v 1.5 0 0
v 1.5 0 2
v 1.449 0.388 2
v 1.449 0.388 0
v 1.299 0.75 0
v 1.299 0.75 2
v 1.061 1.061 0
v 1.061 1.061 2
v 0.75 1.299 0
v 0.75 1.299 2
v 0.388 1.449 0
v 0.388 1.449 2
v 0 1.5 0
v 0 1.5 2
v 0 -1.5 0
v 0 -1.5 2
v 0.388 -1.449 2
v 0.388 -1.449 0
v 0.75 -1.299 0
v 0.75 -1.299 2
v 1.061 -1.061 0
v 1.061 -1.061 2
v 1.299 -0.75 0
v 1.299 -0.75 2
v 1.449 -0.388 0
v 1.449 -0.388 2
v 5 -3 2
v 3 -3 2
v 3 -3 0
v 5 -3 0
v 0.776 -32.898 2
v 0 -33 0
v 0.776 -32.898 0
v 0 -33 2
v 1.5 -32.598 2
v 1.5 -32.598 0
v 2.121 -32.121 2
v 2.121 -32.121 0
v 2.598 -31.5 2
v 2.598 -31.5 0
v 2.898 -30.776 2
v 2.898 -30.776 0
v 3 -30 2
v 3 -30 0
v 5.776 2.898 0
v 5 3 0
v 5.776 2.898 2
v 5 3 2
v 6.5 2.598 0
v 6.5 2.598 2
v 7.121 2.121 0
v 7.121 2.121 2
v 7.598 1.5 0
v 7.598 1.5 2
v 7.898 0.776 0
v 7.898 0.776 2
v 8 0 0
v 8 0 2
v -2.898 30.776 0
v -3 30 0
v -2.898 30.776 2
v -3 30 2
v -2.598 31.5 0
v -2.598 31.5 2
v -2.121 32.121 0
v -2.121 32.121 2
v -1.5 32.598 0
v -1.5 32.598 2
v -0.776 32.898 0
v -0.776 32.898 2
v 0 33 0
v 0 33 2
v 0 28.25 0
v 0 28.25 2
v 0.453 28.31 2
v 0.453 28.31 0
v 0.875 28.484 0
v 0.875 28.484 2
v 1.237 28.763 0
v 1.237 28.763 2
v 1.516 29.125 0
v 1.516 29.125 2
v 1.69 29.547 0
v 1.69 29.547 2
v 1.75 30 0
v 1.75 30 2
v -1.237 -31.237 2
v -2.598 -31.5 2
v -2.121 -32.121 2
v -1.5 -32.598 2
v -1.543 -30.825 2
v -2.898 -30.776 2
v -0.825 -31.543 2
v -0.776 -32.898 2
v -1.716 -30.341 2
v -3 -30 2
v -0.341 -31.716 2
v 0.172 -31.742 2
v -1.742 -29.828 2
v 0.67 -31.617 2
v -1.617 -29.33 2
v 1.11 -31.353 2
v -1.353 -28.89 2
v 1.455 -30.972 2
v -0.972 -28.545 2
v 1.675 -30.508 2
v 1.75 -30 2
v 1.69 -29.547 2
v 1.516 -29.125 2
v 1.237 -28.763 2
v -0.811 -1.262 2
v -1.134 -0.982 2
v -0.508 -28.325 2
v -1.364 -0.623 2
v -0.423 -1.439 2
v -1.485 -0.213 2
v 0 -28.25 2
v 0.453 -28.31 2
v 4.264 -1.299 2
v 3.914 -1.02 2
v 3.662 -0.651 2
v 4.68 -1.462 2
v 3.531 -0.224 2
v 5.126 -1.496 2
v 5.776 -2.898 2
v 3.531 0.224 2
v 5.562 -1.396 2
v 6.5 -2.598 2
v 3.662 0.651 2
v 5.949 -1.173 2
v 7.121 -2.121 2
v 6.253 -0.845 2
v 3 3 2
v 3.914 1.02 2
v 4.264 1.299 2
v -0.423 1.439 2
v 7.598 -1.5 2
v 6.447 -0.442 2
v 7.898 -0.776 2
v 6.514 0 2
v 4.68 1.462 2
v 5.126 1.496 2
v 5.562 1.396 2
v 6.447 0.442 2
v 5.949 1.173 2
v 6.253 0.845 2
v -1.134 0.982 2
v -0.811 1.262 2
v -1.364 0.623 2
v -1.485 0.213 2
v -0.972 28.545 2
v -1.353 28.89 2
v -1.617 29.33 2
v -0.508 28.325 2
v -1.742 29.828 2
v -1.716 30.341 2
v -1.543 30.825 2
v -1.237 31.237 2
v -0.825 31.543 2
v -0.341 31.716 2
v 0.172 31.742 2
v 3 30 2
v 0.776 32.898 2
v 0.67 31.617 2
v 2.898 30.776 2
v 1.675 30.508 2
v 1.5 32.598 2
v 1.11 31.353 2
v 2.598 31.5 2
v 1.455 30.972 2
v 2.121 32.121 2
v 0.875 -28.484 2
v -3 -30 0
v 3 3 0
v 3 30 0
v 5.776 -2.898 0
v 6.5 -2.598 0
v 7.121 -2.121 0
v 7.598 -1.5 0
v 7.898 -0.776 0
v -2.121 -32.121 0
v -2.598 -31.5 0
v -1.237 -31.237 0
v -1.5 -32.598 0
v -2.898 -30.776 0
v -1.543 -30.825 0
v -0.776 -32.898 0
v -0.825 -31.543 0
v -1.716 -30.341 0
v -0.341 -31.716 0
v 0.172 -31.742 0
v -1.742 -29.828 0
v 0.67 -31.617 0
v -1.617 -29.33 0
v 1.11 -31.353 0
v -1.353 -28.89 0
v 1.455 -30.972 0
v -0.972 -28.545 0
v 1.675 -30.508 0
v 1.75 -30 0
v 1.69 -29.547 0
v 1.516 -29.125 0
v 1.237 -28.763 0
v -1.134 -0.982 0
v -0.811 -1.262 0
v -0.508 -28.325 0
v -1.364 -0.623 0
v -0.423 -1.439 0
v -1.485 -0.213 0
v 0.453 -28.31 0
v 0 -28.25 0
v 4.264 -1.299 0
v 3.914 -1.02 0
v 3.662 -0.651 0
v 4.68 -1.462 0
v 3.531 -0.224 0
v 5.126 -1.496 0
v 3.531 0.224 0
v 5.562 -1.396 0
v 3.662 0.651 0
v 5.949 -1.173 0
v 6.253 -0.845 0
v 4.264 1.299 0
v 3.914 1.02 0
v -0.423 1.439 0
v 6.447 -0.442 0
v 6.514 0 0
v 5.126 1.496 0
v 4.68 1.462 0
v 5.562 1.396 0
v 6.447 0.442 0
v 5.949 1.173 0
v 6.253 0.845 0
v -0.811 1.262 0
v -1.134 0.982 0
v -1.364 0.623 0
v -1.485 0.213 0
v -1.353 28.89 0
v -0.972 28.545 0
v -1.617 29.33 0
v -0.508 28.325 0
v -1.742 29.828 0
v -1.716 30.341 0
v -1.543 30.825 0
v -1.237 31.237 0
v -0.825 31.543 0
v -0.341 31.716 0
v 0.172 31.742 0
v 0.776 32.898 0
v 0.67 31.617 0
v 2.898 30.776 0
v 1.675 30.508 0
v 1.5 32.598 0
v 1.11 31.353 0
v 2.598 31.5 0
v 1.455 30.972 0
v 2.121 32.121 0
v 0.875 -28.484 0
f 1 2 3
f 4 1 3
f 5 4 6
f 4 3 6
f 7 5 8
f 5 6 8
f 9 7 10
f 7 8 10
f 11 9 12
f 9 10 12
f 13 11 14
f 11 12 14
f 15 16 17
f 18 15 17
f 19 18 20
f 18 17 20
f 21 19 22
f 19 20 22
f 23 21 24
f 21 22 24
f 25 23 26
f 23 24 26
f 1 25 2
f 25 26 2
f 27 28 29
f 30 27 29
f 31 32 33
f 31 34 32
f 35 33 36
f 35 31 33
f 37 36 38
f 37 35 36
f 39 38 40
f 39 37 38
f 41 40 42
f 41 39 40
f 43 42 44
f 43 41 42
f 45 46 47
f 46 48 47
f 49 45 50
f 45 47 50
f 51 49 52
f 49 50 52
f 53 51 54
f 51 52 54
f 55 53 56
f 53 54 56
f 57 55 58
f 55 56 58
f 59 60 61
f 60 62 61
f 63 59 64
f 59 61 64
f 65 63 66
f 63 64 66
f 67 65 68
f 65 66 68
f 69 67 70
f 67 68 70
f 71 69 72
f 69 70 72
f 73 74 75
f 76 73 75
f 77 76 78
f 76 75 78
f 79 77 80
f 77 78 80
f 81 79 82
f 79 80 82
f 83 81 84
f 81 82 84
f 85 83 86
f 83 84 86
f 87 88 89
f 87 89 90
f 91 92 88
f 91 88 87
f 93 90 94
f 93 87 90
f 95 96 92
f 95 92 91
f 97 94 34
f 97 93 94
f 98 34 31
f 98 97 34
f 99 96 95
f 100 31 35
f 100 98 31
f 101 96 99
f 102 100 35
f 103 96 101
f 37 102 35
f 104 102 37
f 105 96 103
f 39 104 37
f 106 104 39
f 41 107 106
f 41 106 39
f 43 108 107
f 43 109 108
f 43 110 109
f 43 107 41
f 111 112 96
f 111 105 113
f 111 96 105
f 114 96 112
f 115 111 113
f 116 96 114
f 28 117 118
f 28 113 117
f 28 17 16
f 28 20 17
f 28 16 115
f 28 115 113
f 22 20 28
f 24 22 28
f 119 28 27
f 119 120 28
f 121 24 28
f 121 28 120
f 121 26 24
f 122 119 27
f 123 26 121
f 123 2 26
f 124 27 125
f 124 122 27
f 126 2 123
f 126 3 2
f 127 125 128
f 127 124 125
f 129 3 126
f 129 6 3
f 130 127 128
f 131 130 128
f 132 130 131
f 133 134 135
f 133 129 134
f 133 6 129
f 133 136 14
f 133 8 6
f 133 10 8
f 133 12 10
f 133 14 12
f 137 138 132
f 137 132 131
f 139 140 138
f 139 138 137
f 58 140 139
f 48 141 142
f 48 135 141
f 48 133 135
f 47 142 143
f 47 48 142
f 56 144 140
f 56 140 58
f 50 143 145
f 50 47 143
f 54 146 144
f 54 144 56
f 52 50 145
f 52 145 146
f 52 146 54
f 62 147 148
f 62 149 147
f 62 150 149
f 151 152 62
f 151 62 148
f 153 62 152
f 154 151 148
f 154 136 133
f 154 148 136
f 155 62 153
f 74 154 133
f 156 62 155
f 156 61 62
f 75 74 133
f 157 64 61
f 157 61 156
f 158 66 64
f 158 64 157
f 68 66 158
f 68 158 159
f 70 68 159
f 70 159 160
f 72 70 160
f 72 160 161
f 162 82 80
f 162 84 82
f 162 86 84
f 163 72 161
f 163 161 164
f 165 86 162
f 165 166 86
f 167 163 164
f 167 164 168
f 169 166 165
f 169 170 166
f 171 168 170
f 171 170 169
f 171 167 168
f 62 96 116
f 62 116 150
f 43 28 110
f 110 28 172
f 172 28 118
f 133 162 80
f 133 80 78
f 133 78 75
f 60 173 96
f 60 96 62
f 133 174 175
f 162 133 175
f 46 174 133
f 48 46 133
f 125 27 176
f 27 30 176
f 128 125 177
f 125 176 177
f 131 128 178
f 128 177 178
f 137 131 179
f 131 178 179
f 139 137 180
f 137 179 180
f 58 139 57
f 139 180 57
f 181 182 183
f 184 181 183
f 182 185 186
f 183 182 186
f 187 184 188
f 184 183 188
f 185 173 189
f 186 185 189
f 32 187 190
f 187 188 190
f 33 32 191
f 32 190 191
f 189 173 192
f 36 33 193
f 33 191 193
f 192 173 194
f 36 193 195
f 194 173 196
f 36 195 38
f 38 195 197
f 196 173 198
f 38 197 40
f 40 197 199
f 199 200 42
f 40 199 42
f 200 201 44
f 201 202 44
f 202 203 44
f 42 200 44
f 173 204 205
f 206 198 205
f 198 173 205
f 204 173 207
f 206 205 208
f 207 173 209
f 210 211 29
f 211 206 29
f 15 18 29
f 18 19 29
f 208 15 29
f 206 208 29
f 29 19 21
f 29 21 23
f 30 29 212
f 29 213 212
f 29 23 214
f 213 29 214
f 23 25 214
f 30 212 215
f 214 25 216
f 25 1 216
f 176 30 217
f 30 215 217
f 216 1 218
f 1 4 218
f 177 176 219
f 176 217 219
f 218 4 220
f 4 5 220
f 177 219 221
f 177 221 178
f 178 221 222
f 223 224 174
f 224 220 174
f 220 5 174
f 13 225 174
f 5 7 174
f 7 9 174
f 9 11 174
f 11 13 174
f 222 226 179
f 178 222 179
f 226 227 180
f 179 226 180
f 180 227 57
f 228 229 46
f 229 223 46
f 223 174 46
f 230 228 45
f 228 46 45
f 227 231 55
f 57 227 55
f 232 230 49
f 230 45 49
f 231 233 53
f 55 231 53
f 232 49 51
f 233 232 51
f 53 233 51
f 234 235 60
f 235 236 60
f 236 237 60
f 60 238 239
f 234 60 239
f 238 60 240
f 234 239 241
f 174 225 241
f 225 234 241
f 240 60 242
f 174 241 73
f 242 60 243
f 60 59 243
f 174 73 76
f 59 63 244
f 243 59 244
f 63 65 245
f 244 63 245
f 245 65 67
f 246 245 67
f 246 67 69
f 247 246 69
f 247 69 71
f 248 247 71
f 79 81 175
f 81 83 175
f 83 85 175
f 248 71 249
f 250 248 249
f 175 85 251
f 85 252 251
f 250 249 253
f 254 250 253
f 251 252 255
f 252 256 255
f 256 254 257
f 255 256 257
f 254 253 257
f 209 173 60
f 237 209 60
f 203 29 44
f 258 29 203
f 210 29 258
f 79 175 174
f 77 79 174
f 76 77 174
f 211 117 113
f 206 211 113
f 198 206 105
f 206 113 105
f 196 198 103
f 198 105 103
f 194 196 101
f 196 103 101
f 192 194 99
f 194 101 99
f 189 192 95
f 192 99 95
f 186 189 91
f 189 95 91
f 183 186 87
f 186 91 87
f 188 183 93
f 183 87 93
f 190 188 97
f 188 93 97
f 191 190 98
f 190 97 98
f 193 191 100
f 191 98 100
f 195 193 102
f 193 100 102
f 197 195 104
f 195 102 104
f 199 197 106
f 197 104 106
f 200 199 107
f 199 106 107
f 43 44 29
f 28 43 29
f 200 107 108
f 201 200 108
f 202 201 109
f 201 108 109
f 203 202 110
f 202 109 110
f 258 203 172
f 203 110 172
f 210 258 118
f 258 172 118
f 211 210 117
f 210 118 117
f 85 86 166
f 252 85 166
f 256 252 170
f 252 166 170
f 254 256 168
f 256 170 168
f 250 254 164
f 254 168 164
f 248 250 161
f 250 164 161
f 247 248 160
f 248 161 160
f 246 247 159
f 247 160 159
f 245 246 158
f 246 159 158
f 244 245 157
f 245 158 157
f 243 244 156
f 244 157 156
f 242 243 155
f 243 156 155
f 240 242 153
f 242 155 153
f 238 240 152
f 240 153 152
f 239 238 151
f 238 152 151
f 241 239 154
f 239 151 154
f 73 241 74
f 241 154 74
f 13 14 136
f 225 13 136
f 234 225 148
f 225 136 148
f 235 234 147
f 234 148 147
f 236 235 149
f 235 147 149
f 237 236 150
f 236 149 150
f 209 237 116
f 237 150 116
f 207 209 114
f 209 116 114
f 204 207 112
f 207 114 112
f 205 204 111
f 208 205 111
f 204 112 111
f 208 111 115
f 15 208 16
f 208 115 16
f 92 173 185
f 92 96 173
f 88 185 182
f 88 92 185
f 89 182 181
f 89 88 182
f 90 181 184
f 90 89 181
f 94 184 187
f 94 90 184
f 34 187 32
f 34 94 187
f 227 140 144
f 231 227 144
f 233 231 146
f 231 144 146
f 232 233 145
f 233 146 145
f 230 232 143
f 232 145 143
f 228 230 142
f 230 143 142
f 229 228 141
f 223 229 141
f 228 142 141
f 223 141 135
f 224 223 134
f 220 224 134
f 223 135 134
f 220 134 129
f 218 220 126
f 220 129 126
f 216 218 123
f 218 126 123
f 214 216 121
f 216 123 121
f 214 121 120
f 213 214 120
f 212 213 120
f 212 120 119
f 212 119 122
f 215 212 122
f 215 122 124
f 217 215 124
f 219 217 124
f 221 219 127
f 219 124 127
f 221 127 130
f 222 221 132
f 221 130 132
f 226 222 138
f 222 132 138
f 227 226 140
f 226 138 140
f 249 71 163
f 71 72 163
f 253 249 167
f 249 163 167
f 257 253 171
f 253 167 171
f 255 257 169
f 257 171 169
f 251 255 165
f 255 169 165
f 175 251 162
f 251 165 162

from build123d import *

# Parameters (mm, degrees)
F0_W     = 6
F0_H     = 66
F1_DEPTH = 2
F3_DEPTH = 2
F5_DEPTH = 5
F6_R     = 1.5
F7_DEPTH = 2
F8_R     = 2.99999


# Not quite as in the source:
# - a fillet or chamfer is up to 0.001 mm smaller than in the source, because OpenCascade refuses the exact size


with BuildPart() as f1:
    # F0 (on Top) → F1 (new body)
    with BuildSketch(Plane.XY):
        Rectangle(F0_W, F0_H)
    extrude(amount=F1_DEPTH)

    # F2 (on face) → F3 (cut, through all)
    with BuildSketch(Plane.XY.offset(2)):
        with BuildLine():
            ThreePointArc((0, -1.5), (1.0606601718, -1.0606601718), (1.5, 0))
            ThreePointArc((1.5, 0), (1.0606601718, 1.0606601718), (0, 1.5))
            Line((0, 1.5), (0, 0))
            Line((0, 0), (0, -1.5))
        make_face()
        with BuildLine():
            ThreePointArc((1.75, -30), (1.2374368671, -28.7625631329), (0, -28.25))
            ThreePointArc((0, -28.25), (-1.2374368671, -31.2374368671), (1.75, -30))
        make_face()
        with BuildLine():
            ThreePointArc((1.75, 30), (-1.2374368671, 31.2374368671), (0, 28.25))
            ThreePointArc((0, 28.25), (1.2374368671, 28.7625631329), (1.75, 30))
        make_face()
        with BuildLine():
            Line((0, 0), (0, 1.5))
            ThreePointArc((0, 1.5), (-1.5, 0), (0, -1.5))
            Line((0, -1.5), (0, 0))
        make_face()
    extrude(amount=-F3_DEPTH, mode=Mode.SUBTRACT)

    # F4 (on face) → F5 (join)
    with BuildSketch(Plane.YZ.offset(3)):
        Polygon((3, 2), (0, 2), (-3, 2), (-3, 0), (0, 0), (3, 0), align=None)
    extrude(amount=F5_DEPTH)

    # F6 (on face) → F7 (cut, through all)
    with BuildSketch(Plane.XY.offset(2)):
        with Locations((5.0139404441, 0)):
            Circle(F6_R)
    extrude(amount=-F7_DEPTH, mode=Mode.SUBTRACT)

    # F8 (radius 3 in the source; OpenCascade refuses exactly that, so slightly less here)
    f8_edges = [f1.edges().sort_by_distance(p)[0] for p in [
        (-3, -33, 1),
        (3, -33, 1),
        (3, 33, 1),
        (-3, 33, 1),
        (8, -3, 1),
        (8, 3, 1),
    ]]
    fillet(f8_edges, radius=F8_R)


solid = f1.part
